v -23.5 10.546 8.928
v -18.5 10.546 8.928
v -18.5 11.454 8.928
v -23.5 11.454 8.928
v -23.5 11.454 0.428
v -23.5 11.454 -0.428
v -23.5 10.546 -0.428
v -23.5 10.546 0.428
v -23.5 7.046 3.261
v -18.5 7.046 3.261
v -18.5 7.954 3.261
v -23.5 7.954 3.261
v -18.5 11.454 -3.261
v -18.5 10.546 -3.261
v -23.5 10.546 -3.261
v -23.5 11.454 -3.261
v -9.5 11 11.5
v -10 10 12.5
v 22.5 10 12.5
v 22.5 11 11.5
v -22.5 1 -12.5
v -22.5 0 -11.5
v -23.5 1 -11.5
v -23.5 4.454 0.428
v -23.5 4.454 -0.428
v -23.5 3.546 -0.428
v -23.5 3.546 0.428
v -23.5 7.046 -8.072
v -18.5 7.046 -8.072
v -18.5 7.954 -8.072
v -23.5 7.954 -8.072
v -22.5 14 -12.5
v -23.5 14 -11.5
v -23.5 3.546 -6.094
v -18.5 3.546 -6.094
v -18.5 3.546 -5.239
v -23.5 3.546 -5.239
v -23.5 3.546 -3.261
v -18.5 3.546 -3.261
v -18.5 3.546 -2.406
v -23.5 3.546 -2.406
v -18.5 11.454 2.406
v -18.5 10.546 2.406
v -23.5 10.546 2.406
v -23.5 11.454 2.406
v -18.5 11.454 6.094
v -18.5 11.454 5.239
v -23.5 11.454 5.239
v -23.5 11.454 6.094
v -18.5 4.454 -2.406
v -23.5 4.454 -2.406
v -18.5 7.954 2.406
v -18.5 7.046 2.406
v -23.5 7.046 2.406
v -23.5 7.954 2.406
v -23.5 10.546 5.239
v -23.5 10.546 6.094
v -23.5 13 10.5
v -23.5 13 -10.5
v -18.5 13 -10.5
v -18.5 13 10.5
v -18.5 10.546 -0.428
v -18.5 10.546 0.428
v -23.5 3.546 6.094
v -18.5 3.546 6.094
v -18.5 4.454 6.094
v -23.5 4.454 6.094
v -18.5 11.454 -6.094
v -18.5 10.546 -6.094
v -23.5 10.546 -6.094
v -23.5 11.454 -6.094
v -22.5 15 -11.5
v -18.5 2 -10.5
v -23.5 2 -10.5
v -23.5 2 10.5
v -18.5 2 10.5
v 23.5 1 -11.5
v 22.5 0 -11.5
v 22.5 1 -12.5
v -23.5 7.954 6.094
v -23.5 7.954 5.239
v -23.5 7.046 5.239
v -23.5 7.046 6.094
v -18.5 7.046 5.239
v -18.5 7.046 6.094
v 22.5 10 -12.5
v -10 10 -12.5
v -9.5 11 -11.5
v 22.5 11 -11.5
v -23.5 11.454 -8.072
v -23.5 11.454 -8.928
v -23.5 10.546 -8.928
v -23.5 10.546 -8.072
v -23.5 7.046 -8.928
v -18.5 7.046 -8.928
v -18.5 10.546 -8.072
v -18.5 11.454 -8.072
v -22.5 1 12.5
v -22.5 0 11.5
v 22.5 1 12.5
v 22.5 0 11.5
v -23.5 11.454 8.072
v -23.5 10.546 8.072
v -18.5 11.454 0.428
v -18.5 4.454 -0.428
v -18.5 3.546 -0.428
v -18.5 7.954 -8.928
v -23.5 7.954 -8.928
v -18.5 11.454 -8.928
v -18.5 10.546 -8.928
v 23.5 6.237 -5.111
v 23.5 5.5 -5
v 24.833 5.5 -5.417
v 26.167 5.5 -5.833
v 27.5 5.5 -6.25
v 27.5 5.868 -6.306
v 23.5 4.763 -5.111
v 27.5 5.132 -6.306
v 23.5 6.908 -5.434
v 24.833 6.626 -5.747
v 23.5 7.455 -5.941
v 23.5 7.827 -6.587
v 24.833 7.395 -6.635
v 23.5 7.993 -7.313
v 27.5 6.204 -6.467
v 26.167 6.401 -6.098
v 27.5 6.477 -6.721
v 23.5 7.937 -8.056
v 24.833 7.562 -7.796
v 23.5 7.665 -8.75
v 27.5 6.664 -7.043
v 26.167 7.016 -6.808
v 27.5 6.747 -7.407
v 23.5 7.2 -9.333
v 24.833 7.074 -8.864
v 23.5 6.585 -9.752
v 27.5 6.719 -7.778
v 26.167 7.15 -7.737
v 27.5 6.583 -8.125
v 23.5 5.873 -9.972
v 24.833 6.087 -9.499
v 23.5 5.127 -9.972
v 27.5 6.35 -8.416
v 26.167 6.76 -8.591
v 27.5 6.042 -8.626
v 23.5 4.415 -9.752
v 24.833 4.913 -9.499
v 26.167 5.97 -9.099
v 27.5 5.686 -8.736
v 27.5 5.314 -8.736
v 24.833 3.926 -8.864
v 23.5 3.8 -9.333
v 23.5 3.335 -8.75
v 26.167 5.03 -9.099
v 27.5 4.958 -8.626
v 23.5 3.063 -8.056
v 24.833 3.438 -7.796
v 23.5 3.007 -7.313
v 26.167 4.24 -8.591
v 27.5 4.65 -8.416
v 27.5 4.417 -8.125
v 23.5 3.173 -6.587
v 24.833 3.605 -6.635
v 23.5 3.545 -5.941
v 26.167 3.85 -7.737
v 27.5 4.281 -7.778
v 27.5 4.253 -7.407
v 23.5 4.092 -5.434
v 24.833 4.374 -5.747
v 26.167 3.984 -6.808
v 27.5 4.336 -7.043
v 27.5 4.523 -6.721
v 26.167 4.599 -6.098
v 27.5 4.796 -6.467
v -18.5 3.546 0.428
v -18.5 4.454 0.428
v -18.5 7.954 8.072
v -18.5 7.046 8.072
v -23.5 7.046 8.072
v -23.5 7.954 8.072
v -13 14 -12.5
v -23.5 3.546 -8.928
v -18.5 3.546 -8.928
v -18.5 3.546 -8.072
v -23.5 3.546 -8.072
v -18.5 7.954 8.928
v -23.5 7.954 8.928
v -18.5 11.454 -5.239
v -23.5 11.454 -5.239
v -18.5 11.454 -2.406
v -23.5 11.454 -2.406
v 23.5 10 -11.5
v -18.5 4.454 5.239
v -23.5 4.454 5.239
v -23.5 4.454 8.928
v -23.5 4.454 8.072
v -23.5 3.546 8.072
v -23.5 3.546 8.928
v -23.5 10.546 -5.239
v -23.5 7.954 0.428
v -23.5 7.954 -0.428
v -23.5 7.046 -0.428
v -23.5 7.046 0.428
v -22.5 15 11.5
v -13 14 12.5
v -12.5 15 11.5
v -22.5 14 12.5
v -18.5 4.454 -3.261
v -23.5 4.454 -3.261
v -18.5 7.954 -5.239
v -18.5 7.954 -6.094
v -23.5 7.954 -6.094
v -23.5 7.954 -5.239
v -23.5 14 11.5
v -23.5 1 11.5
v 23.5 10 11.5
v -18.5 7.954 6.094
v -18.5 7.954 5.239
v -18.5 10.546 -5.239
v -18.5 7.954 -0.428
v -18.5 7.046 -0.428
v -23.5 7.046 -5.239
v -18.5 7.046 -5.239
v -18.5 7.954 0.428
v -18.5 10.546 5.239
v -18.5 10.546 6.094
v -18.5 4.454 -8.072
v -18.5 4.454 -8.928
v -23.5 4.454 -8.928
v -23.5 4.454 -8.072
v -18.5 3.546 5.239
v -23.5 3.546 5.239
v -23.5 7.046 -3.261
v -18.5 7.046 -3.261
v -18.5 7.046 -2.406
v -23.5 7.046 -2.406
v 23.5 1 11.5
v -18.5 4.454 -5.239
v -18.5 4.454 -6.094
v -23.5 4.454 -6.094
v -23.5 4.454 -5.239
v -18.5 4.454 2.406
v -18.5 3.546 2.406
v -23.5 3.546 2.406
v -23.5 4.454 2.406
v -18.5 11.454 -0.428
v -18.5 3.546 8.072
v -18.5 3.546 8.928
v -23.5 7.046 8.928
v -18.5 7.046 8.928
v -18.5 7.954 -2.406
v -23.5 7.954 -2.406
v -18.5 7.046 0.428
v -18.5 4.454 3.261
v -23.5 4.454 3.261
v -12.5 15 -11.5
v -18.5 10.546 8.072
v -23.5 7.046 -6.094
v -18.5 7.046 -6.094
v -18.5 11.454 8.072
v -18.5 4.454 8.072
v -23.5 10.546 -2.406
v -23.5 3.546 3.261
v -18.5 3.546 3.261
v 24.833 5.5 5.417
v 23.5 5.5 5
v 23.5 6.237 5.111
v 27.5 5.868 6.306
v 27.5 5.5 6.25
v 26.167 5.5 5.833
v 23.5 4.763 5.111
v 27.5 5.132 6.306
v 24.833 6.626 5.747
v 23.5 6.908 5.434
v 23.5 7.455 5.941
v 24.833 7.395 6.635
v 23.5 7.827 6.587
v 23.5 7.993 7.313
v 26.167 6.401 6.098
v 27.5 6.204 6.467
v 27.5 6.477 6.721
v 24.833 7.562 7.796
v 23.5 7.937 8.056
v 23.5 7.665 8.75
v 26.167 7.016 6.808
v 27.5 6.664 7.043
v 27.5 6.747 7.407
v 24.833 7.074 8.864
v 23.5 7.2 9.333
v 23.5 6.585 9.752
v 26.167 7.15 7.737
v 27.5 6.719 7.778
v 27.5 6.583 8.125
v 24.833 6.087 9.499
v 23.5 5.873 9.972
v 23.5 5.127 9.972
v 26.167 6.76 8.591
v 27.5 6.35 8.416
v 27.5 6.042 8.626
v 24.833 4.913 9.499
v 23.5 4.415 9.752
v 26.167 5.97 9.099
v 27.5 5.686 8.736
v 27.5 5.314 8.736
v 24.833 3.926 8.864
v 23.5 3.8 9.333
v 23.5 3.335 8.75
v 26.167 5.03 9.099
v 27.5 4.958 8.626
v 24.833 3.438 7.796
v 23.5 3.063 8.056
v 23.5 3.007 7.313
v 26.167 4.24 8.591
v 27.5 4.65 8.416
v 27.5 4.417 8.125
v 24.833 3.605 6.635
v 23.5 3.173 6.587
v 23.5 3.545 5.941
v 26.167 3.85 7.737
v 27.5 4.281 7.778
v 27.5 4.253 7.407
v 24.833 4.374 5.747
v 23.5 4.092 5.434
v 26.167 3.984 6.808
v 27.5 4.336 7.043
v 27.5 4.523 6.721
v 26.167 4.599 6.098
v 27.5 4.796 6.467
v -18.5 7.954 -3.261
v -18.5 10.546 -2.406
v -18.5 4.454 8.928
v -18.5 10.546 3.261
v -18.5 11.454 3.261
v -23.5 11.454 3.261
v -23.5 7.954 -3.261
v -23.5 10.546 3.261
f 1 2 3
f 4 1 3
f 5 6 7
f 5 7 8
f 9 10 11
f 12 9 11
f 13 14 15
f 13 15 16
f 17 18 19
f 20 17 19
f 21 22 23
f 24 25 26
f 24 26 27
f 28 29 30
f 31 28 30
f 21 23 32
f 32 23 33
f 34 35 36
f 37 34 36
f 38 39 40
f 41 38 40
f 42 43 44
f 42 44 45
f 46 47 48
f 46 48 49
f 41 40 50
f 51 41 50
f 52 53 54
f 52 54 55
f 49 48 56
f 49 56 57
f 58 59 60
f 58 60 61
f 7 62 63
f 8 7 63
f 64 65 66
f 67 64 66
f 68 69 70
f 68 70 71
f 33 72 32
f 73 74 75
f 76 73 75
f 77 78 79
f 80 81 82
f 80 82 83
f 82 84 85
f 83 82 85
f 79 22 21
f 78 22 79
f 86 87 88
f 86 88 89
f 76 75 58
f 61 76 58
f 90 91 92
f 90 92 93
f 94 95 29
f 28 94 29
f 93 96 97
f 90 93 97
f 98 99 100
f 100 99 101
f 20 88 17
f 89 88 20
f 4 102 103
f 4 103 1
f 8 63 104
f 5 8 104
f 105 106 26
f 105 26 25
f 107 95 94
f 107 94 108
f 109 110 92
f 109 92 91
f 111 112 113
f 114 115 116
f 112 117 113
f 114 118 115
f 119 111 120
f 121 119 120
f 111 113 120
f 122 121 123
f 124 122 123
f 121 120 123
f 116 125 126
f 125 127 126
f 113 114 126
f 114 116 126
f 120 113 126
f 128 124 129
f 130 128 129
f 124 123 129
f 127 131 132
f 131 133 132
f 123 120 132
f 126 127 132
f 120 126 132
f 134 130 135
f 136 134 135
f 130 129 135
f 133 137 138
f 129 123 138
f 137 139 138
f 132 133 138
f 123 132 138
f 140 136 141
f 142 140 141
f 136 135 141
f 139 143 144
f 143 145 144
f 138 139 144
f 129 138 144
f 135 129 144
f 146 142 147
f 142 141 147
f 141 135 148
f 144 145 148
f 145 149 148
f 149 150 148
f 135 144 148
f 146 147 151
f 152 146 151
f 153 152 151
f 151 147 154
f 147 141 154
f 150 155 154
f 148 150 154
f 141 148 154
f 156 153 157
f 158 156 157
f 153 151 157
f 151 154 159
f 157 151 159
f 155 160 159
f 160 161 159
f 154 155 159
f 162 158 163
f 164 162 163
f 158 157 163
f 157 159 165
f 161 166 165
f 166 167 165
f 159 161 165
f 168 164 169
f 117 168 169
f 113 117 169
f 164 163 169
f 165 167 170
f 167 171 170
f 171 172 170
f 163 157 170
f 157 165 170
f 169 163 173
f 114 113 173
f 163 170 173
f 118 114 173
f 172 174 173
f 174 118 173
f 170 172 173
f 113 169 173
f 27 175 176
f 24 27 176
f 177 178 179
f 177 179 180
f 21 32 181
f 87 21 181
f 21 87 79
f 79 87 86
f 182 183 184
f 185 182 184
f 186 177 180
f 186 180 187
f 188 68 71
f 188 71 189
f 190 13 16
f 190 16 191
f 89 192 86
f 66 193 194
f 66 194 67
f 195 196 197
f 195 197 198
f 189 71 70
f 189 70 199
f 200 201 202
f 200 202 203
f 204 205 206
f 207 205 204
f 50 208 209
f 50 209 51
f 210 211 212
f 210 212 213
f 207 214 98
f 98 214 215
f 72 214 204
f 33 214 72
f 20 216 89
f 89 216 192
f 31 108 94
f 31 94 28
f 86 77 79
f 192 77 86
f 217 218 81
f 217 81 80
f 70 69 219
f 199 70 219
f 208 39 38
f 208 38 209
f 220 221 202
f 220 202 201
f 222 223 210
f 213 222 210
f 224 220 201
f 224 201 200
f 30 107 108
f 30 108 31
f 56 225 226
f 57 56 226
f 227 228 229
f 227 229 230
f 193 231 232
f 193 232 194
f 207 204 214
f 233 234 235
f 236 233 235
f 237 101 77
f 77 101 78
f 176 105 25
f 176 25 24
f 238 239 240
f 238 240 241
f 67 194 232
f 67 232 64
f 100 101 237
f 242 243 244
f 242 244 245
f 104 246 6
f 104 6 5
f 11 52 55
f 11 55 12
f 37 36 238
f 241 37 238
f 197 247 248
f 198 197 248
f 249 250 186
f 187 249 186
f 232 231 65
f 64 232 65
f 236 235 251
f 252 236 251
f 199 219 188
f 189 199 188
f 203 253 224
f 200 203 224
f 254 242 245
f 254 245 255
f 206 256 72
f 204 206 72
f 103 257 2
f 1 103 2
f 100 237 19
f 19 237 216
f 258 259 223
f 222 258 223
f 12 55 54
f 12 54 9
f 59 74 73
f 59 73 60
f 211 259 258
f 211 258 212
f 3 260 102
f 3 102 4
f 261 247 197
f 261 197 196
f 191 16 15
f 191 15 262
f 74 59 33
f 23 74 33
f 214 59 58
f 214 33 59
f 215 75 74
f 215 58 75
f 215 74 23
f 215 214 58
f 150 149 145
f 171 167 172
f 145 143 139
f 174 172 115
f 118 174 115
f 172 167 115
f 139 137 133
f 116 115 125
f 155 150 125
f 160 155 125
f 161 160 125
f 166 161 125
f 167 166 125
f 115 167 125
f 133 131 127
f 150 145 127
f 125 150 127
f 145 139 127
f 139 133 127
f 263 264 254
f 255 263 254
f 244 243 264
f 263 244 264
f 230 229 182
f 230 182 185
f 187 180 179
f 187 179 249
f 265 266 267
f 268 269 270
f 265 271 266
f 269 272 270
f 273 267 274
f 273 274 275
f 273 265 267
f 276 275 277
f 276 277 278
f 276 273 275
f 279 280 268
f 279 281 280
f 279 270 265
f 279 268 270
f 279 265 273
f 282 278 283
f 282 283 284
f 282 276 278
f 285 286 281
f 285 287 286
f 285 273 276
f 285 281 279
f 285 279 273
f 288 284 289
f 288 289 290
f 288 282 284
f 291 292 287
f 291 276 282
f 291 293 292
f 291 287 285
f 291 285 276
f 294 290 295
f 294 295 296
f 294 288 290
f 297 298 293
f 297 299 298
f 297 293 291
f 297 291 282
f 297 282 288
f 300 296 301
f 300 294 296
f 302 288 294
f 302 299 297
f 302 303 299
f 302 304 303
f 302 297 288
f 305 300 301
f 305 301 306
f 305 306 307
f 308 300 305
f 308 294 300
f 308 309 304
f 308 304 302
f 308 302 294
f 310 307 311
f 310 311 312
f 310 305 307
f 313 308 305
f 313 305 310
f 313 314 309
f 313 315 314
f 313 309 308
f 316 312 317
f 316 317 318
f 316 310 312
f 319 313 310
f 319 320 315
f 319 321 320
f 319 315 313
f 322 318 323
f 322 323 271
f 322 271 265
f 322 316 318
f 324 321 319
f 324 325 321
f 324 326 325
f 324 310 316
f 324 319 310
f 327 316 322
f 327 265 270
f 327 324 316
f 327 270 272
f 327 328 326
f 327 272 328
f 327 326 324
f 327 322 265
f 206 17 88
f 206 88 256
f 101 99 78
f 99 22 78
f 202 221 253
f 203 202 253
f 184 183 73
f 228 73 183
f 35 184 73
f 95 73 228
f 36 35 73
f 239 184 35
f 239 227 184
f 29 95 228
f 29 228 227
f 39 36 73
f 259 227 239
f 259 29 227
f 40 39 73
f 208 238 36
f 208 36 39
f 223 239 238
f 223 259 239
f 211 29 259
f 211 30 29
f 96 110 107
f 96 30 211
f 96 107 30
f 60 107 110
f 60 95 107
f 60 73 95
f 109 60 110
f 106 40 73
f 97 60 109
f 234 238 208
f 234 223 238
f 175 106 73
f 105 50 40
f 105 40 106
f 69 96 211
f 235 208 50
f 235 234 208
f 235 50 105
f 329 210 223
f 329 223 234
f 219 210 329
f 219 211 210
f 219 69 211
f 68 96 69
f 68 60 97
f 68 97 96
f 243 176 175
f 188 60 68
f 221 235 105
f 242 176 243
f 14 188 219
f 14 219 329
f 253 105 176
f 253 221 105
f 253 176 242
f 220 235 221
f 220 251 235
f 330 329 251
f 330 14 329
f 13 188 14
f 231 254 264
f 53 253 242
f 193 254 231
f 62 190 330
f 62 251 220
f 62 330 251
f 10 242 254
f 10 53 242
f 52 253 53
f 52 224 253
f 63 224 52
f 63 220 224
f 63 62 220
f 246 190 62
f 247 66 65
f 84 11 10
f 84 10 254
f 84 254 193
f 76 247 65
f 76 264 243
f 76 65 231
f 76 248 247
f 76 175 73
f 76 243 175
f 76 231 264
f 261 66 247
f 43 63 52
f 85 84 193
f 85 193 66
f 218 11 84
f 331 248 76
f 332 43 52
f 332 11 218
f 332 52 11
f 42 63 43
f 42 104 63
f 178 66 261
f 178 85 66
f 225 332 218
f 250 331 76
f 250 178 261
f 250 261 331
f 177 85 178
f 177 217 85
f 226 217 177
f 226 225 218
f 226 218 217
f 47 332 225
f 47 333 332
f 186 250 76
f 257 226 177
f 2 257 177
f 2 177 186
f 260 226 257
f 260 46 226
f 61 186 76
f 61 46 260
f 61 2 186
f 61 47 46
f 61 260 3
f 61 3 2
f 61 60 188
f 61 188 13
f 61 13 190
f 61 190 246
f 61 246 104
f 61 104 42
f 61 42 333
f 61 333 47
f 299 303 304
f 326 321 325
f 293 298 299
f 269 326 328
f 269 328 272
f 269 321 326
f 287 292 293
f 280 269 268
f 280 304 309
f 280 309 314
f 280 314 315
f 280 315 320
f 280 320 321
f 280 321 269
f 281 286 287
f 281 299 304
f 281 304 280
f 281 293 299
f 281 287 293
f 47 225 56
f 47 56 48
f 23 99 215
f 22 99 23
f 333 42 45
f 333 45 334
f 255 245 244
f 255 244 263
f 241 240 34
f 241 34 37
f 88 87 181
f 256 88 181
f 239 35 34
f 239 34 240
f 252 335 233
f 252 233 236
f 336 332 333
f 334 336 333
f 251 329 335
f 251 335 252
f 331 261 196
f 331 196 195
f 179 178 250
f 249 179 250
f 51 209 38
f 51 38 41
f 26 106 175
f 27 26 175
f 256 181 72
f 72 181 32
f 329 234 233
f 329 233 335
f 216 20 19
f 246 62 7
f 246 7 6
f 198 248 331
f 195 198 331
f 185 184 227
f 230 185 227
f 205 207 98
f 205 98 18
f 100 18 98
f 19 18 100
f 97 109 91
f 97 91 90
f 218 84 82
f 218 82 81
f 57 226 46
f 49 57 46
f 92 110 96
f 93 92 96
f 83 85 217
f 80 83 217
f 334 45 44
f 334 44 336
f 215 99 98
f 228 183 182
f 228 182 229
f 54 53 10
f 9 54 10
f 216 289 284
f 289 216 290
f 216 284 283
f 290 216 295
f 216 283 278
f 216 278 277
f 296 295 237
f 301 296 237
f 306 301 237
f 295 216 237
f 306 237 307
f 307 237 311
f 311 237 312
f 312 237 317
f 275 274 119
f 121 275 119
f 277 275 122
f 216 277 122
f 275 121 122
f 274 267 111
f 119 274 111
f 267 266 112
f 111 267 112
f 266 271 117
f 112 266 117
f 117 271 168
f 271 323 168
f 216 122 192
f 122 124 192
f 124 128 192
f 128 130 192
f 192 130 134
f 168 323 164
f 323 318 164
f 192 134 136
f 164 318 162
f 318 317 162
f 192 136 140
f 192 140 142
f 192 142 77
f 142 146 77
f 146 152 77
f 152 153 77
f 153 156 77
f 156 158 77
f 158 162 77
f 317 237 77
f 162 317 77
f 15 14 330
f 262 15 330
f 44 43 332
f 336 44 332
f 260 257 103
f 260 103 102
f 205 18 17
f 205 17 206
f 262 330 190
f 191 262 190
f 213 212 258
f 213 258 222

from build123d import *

# Parameters (mm, degrees)
SKETCH2_W            = 47
SKETCH2_H            = 25
BOSS_EXTRUDE1_DEPTH  = 11
BOSS_EXTRUDE2_DEPTH  = 25
SKETCH4_W            = 21
SKETCH4_H            = 11
CUT_EXTRUDE1_DEPTH   = 5
SKETCH5_R            = 2.5
SKETCH6_R            = 1.25
CHAMFER1_SIZE        = 1
SKETCH7_W            = 0.855148952
SKETCH7_H            = 0.908595762
BOSS_EXTRUDE3_DEPTH  = 5
LPATTERN1_COUNT      = 7
LPATTERN1_PITCH      = 2.833333333
LPATTERN1_COUNT_DIR2 = 3
LPATTERN1_PITCH_DIR2 = 3.5


with BuildPart() as part:
    # Sketch2 → Boss-Extrude1 (new body)
    with BuildSketch(Plane(origin=(0, 0, 0), x_dir=(1, 0, 0), z_dir=(0, 1, 0))):
        Rectangle(SKETCH2_W, SKETCH2_H)
    extrude(amount=BOSS_EXTRUDE1_DEPTH)

    # Sketch3 → Boss-Extrude2 (add)
    with BuildSketch(Plane.XY.offset(12.5)):
        Polygon((-23.5, 11), (-9.5, 11), (-12.5, 15), (-23.5, 15), align=None)
    extrude(amount=-BOSS_EXTRUDE2_DEPTH)

    # Sketch4 → Cut-Extrude1 (cut)
    with BuildSketch(Plane.ZY.offset(23.5)):
        with Locations((0, 7.5)):
            Rectangle(SKETCH4_W, SKETCH4_H)
    extrude(amount=-CUT_EXTRUDE1_DEPTH, mode=Mode.SUBTRACT)

    # Sketch5 → Loft1 section 0
    with BuildSketch(Plane(origin=(23.5, 0, 0), x_dir=(0, 0, -1), z_dir=(1, 0, 0))):
        with Locations((-7.5, 5.5)):
            Circle(SKETCH5_R)
    # Sketch6 → Loft1 section 1
    with BuildSketch(Plane(origin=(27.5, 0, 0), x_dir=(0, 0, -1), z_dir=(1, 0, 0))):
        with Locations((-7.5, 5.5)):
            Circle(SKETCH6_R)
    loft1 = loft()

    # Mirror1: Loft1 across plane
    add(loft1.mirror(Plane.XY))

    # Chamfer1
    chamfer1_edges = [part.edges().sort_by_distance(p)[0] for p in [
        (7, 11, 12.5),
        (-23.5, 15, 0),
        (-11, 13, 12.5),
        (-18, 15, 12.5),
        (-18, 15, -12.5),
        (-11, 13, -12.5),
        (23.5, 11, 0),
        (0, 0, 12.5),
        (-23.5, 0, 0),
        (0, 0, -12.5),
        (23.5, 0, 0),
        (23.5, 5.5, 12.5),
        (-23.5, 7.5, 12.5),
        (-23.5, 7.5, -12.5),
        (23.5, 5.5, -12.5),
        (7, 11, -12.5),
    ]]
    chamfer(chamfer1_edges, length=CHAMFER1_SIZE)

    # Sketch7 → Boss-Extrude3 (add)
    with BuildSketch(Plane.ZY.offset(18.5)):
        with Locations((-8.5, 4)):
            Rectangle(SKETCH7_W, SKETCH7_H)
    boss_extrude3 = extrude(amount=BOSS_EXTRUDE3_DEPTH)

    # LPattern1: Boss-Extrude3 7 × 3
    with Locations(*[(0, j * LPATTERN1_PITCH_DIR2, i * LPATTERN1_PITCH) for i in range(LPATTERN1_COUNT) for j in range(LPATTERN1_COUNT_DIR2) if (i, j) != (0, 0)]):
        add(boss_extrude3)


solid = part.part
